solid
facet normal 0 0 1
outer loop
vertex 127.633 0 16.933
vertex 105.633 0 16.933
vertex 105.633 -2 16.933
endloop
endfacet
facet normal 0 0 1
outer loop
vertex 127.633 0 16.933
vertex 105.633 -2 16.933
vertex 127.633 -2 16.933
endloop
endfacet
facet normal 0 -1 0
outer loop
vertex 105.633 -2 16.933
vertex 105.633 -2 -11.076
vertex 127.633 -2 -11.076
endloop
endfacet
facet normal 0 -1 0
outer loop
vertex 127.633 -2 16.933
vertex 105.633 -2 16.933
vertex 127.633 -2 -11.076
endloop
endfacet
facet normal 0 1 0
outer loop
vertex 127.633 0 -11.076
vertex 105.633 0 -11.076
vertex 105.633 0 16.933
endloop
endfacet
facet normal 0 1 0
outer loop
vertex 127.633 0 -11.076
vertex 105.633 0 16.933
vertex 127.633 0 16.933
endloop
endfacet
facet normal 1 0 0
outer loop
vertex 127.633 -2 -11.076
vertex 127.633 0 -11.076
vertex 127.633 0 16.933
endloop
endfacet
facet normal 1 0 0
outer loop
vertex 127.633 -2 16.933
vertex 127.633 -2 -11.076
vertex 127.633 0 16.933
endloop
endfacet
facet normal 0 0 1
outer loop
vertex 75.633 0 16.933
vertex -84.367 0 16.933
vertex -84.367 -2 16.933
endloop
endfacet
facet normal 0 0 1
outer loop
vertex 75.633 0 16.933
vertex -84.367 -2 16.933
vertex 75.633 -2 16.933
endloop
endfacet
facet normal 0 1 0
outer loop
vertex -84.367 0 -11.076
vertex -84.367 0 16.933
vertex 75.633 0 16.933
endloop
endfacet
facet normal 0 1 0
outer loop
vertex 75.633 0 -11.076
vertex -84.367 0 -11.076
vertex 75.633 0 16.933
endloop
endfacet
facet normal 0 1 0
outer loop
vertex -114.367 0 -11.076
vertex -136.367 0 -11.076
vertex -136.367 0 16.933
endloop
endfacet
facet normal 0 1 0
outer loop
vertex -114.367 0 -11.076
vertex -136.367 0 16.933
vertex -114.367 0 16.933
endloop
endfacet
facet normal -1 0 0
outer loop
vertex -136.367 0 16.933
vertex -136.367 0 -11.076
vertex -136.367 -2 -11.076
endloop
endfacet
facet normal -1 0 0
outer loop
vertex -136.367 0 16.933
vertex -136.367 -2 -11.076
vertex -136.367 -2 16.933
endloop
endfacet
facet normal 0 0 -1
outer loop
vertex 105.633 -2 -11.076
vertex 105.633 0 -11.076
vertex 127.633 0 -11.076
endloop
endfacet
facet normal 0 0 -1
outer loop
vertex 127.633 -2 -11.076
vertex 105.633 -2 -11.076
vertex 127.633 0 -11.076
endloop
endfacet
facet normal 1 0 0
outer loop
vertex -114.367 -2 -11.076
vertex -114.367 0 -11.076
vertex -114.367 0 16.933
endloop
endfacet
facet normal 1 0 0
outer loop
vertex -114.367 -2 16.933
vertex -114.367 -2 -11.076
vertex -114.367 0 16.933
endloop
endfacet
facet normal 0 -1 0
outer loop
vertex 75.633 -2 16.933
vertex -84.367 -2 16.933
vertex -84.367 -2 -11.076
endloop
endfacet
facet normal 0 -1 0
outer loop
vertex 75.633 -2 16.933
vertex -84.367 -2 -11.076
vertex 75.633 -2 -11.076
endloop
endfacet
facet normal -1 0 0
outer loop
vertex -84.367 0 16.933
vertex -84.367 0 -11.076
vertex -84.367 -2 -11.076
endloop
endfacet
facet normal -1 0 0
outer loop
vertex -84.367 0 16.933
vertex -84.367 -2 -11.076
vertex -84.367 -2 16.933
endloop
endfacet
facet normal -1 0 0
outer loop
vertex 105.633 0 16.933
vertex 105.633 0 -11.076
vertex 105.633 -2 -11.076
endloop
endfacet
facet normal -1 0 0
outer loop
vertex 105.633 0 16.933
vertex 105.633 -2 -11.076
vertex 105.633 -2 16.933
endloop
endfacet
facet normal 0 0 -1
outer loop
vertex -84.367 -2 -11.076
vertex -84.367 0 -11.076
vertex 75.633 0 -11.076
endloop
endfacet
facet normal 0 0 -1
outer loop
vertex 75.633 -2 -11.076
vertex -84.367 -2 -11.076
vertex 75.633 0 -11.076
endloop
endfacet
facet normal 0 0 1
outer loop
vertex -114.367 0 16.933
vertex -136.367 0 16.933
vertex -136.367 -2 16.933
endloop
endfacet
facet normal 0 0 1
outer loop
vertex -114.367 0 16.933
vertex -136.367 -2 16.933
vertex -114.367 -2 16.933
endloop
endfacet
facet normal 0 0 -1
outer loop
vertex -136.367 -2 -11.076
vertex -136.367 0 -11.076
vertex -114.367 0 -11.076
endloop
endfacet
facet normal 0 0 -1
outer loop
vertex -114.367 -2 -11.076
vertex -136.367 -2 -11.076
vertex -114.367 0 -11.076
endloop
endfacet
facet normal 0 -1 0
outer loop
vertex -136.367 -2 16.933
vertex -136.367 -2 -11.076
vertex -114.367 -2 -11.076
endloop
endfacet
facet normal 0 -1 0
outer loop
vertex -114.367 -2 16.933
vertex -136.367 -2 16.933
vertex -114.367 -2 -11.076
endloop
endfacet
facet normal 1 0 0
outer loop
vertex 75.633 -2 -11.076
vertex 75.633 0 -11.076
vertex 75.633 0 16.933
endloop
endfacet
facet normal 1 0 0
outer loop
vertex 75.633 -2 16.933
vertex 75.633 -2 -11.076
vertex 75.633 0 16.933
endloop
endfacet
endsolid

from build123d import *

# Parameters (mm, degrees)
F0_W     = 160.0000202656
F0_H     = 28.0090686734
F0_W_2   = 156
F0_H_2   = 16
F1_DEPTH = 2
F0_W_3   = 22
F2_DEPTH = 2
F3_DEPTH = 2


# Not quite as in the source:
# - a feature names something its author has since deleted; it is built from what else it names


with BuildPart() as f1:
    # F0 (on Front) → F1 (new body)
    with BuildSketch(Plane.XZ):
        with Locations((-4.366838785, 2.9287685109)):
            Rectangle(F0_W, F0_H)
        with Locations((-4.3668536862, -1.0666644891)):
            Rectangle(F0_W_2, F0_H_2, mode=Mode.SUBTRACT)
        with Locations((-4.3668536862, -1.0666644891)):
            Rectangle(F0_W_2, F0_H_2)
    extrude(amount=F1_DEPTH)


with BuildPart() as f2:
    # F0 (on Front) → F2 (new body)
    with BuildSketch(Plane.XZ):
        with Locations((116.6331713478, 2.9287685109)):
            Rectangle(F0_W_3, F0_H)
    extrude(amount=F2_DEPTH)


with BuildPart() as f3:
    # F0 (on Front) → F3 (new body)
    with BuildSketch(Plane.XZ):
        with Locations((-125.3668489178, 2.9287685109)):
            Rectangle(F0_W_3, F0_H)
    extrude(amount=F3_DEPTH)


solid = Compound([f1.part, f2.part, f3.part])
